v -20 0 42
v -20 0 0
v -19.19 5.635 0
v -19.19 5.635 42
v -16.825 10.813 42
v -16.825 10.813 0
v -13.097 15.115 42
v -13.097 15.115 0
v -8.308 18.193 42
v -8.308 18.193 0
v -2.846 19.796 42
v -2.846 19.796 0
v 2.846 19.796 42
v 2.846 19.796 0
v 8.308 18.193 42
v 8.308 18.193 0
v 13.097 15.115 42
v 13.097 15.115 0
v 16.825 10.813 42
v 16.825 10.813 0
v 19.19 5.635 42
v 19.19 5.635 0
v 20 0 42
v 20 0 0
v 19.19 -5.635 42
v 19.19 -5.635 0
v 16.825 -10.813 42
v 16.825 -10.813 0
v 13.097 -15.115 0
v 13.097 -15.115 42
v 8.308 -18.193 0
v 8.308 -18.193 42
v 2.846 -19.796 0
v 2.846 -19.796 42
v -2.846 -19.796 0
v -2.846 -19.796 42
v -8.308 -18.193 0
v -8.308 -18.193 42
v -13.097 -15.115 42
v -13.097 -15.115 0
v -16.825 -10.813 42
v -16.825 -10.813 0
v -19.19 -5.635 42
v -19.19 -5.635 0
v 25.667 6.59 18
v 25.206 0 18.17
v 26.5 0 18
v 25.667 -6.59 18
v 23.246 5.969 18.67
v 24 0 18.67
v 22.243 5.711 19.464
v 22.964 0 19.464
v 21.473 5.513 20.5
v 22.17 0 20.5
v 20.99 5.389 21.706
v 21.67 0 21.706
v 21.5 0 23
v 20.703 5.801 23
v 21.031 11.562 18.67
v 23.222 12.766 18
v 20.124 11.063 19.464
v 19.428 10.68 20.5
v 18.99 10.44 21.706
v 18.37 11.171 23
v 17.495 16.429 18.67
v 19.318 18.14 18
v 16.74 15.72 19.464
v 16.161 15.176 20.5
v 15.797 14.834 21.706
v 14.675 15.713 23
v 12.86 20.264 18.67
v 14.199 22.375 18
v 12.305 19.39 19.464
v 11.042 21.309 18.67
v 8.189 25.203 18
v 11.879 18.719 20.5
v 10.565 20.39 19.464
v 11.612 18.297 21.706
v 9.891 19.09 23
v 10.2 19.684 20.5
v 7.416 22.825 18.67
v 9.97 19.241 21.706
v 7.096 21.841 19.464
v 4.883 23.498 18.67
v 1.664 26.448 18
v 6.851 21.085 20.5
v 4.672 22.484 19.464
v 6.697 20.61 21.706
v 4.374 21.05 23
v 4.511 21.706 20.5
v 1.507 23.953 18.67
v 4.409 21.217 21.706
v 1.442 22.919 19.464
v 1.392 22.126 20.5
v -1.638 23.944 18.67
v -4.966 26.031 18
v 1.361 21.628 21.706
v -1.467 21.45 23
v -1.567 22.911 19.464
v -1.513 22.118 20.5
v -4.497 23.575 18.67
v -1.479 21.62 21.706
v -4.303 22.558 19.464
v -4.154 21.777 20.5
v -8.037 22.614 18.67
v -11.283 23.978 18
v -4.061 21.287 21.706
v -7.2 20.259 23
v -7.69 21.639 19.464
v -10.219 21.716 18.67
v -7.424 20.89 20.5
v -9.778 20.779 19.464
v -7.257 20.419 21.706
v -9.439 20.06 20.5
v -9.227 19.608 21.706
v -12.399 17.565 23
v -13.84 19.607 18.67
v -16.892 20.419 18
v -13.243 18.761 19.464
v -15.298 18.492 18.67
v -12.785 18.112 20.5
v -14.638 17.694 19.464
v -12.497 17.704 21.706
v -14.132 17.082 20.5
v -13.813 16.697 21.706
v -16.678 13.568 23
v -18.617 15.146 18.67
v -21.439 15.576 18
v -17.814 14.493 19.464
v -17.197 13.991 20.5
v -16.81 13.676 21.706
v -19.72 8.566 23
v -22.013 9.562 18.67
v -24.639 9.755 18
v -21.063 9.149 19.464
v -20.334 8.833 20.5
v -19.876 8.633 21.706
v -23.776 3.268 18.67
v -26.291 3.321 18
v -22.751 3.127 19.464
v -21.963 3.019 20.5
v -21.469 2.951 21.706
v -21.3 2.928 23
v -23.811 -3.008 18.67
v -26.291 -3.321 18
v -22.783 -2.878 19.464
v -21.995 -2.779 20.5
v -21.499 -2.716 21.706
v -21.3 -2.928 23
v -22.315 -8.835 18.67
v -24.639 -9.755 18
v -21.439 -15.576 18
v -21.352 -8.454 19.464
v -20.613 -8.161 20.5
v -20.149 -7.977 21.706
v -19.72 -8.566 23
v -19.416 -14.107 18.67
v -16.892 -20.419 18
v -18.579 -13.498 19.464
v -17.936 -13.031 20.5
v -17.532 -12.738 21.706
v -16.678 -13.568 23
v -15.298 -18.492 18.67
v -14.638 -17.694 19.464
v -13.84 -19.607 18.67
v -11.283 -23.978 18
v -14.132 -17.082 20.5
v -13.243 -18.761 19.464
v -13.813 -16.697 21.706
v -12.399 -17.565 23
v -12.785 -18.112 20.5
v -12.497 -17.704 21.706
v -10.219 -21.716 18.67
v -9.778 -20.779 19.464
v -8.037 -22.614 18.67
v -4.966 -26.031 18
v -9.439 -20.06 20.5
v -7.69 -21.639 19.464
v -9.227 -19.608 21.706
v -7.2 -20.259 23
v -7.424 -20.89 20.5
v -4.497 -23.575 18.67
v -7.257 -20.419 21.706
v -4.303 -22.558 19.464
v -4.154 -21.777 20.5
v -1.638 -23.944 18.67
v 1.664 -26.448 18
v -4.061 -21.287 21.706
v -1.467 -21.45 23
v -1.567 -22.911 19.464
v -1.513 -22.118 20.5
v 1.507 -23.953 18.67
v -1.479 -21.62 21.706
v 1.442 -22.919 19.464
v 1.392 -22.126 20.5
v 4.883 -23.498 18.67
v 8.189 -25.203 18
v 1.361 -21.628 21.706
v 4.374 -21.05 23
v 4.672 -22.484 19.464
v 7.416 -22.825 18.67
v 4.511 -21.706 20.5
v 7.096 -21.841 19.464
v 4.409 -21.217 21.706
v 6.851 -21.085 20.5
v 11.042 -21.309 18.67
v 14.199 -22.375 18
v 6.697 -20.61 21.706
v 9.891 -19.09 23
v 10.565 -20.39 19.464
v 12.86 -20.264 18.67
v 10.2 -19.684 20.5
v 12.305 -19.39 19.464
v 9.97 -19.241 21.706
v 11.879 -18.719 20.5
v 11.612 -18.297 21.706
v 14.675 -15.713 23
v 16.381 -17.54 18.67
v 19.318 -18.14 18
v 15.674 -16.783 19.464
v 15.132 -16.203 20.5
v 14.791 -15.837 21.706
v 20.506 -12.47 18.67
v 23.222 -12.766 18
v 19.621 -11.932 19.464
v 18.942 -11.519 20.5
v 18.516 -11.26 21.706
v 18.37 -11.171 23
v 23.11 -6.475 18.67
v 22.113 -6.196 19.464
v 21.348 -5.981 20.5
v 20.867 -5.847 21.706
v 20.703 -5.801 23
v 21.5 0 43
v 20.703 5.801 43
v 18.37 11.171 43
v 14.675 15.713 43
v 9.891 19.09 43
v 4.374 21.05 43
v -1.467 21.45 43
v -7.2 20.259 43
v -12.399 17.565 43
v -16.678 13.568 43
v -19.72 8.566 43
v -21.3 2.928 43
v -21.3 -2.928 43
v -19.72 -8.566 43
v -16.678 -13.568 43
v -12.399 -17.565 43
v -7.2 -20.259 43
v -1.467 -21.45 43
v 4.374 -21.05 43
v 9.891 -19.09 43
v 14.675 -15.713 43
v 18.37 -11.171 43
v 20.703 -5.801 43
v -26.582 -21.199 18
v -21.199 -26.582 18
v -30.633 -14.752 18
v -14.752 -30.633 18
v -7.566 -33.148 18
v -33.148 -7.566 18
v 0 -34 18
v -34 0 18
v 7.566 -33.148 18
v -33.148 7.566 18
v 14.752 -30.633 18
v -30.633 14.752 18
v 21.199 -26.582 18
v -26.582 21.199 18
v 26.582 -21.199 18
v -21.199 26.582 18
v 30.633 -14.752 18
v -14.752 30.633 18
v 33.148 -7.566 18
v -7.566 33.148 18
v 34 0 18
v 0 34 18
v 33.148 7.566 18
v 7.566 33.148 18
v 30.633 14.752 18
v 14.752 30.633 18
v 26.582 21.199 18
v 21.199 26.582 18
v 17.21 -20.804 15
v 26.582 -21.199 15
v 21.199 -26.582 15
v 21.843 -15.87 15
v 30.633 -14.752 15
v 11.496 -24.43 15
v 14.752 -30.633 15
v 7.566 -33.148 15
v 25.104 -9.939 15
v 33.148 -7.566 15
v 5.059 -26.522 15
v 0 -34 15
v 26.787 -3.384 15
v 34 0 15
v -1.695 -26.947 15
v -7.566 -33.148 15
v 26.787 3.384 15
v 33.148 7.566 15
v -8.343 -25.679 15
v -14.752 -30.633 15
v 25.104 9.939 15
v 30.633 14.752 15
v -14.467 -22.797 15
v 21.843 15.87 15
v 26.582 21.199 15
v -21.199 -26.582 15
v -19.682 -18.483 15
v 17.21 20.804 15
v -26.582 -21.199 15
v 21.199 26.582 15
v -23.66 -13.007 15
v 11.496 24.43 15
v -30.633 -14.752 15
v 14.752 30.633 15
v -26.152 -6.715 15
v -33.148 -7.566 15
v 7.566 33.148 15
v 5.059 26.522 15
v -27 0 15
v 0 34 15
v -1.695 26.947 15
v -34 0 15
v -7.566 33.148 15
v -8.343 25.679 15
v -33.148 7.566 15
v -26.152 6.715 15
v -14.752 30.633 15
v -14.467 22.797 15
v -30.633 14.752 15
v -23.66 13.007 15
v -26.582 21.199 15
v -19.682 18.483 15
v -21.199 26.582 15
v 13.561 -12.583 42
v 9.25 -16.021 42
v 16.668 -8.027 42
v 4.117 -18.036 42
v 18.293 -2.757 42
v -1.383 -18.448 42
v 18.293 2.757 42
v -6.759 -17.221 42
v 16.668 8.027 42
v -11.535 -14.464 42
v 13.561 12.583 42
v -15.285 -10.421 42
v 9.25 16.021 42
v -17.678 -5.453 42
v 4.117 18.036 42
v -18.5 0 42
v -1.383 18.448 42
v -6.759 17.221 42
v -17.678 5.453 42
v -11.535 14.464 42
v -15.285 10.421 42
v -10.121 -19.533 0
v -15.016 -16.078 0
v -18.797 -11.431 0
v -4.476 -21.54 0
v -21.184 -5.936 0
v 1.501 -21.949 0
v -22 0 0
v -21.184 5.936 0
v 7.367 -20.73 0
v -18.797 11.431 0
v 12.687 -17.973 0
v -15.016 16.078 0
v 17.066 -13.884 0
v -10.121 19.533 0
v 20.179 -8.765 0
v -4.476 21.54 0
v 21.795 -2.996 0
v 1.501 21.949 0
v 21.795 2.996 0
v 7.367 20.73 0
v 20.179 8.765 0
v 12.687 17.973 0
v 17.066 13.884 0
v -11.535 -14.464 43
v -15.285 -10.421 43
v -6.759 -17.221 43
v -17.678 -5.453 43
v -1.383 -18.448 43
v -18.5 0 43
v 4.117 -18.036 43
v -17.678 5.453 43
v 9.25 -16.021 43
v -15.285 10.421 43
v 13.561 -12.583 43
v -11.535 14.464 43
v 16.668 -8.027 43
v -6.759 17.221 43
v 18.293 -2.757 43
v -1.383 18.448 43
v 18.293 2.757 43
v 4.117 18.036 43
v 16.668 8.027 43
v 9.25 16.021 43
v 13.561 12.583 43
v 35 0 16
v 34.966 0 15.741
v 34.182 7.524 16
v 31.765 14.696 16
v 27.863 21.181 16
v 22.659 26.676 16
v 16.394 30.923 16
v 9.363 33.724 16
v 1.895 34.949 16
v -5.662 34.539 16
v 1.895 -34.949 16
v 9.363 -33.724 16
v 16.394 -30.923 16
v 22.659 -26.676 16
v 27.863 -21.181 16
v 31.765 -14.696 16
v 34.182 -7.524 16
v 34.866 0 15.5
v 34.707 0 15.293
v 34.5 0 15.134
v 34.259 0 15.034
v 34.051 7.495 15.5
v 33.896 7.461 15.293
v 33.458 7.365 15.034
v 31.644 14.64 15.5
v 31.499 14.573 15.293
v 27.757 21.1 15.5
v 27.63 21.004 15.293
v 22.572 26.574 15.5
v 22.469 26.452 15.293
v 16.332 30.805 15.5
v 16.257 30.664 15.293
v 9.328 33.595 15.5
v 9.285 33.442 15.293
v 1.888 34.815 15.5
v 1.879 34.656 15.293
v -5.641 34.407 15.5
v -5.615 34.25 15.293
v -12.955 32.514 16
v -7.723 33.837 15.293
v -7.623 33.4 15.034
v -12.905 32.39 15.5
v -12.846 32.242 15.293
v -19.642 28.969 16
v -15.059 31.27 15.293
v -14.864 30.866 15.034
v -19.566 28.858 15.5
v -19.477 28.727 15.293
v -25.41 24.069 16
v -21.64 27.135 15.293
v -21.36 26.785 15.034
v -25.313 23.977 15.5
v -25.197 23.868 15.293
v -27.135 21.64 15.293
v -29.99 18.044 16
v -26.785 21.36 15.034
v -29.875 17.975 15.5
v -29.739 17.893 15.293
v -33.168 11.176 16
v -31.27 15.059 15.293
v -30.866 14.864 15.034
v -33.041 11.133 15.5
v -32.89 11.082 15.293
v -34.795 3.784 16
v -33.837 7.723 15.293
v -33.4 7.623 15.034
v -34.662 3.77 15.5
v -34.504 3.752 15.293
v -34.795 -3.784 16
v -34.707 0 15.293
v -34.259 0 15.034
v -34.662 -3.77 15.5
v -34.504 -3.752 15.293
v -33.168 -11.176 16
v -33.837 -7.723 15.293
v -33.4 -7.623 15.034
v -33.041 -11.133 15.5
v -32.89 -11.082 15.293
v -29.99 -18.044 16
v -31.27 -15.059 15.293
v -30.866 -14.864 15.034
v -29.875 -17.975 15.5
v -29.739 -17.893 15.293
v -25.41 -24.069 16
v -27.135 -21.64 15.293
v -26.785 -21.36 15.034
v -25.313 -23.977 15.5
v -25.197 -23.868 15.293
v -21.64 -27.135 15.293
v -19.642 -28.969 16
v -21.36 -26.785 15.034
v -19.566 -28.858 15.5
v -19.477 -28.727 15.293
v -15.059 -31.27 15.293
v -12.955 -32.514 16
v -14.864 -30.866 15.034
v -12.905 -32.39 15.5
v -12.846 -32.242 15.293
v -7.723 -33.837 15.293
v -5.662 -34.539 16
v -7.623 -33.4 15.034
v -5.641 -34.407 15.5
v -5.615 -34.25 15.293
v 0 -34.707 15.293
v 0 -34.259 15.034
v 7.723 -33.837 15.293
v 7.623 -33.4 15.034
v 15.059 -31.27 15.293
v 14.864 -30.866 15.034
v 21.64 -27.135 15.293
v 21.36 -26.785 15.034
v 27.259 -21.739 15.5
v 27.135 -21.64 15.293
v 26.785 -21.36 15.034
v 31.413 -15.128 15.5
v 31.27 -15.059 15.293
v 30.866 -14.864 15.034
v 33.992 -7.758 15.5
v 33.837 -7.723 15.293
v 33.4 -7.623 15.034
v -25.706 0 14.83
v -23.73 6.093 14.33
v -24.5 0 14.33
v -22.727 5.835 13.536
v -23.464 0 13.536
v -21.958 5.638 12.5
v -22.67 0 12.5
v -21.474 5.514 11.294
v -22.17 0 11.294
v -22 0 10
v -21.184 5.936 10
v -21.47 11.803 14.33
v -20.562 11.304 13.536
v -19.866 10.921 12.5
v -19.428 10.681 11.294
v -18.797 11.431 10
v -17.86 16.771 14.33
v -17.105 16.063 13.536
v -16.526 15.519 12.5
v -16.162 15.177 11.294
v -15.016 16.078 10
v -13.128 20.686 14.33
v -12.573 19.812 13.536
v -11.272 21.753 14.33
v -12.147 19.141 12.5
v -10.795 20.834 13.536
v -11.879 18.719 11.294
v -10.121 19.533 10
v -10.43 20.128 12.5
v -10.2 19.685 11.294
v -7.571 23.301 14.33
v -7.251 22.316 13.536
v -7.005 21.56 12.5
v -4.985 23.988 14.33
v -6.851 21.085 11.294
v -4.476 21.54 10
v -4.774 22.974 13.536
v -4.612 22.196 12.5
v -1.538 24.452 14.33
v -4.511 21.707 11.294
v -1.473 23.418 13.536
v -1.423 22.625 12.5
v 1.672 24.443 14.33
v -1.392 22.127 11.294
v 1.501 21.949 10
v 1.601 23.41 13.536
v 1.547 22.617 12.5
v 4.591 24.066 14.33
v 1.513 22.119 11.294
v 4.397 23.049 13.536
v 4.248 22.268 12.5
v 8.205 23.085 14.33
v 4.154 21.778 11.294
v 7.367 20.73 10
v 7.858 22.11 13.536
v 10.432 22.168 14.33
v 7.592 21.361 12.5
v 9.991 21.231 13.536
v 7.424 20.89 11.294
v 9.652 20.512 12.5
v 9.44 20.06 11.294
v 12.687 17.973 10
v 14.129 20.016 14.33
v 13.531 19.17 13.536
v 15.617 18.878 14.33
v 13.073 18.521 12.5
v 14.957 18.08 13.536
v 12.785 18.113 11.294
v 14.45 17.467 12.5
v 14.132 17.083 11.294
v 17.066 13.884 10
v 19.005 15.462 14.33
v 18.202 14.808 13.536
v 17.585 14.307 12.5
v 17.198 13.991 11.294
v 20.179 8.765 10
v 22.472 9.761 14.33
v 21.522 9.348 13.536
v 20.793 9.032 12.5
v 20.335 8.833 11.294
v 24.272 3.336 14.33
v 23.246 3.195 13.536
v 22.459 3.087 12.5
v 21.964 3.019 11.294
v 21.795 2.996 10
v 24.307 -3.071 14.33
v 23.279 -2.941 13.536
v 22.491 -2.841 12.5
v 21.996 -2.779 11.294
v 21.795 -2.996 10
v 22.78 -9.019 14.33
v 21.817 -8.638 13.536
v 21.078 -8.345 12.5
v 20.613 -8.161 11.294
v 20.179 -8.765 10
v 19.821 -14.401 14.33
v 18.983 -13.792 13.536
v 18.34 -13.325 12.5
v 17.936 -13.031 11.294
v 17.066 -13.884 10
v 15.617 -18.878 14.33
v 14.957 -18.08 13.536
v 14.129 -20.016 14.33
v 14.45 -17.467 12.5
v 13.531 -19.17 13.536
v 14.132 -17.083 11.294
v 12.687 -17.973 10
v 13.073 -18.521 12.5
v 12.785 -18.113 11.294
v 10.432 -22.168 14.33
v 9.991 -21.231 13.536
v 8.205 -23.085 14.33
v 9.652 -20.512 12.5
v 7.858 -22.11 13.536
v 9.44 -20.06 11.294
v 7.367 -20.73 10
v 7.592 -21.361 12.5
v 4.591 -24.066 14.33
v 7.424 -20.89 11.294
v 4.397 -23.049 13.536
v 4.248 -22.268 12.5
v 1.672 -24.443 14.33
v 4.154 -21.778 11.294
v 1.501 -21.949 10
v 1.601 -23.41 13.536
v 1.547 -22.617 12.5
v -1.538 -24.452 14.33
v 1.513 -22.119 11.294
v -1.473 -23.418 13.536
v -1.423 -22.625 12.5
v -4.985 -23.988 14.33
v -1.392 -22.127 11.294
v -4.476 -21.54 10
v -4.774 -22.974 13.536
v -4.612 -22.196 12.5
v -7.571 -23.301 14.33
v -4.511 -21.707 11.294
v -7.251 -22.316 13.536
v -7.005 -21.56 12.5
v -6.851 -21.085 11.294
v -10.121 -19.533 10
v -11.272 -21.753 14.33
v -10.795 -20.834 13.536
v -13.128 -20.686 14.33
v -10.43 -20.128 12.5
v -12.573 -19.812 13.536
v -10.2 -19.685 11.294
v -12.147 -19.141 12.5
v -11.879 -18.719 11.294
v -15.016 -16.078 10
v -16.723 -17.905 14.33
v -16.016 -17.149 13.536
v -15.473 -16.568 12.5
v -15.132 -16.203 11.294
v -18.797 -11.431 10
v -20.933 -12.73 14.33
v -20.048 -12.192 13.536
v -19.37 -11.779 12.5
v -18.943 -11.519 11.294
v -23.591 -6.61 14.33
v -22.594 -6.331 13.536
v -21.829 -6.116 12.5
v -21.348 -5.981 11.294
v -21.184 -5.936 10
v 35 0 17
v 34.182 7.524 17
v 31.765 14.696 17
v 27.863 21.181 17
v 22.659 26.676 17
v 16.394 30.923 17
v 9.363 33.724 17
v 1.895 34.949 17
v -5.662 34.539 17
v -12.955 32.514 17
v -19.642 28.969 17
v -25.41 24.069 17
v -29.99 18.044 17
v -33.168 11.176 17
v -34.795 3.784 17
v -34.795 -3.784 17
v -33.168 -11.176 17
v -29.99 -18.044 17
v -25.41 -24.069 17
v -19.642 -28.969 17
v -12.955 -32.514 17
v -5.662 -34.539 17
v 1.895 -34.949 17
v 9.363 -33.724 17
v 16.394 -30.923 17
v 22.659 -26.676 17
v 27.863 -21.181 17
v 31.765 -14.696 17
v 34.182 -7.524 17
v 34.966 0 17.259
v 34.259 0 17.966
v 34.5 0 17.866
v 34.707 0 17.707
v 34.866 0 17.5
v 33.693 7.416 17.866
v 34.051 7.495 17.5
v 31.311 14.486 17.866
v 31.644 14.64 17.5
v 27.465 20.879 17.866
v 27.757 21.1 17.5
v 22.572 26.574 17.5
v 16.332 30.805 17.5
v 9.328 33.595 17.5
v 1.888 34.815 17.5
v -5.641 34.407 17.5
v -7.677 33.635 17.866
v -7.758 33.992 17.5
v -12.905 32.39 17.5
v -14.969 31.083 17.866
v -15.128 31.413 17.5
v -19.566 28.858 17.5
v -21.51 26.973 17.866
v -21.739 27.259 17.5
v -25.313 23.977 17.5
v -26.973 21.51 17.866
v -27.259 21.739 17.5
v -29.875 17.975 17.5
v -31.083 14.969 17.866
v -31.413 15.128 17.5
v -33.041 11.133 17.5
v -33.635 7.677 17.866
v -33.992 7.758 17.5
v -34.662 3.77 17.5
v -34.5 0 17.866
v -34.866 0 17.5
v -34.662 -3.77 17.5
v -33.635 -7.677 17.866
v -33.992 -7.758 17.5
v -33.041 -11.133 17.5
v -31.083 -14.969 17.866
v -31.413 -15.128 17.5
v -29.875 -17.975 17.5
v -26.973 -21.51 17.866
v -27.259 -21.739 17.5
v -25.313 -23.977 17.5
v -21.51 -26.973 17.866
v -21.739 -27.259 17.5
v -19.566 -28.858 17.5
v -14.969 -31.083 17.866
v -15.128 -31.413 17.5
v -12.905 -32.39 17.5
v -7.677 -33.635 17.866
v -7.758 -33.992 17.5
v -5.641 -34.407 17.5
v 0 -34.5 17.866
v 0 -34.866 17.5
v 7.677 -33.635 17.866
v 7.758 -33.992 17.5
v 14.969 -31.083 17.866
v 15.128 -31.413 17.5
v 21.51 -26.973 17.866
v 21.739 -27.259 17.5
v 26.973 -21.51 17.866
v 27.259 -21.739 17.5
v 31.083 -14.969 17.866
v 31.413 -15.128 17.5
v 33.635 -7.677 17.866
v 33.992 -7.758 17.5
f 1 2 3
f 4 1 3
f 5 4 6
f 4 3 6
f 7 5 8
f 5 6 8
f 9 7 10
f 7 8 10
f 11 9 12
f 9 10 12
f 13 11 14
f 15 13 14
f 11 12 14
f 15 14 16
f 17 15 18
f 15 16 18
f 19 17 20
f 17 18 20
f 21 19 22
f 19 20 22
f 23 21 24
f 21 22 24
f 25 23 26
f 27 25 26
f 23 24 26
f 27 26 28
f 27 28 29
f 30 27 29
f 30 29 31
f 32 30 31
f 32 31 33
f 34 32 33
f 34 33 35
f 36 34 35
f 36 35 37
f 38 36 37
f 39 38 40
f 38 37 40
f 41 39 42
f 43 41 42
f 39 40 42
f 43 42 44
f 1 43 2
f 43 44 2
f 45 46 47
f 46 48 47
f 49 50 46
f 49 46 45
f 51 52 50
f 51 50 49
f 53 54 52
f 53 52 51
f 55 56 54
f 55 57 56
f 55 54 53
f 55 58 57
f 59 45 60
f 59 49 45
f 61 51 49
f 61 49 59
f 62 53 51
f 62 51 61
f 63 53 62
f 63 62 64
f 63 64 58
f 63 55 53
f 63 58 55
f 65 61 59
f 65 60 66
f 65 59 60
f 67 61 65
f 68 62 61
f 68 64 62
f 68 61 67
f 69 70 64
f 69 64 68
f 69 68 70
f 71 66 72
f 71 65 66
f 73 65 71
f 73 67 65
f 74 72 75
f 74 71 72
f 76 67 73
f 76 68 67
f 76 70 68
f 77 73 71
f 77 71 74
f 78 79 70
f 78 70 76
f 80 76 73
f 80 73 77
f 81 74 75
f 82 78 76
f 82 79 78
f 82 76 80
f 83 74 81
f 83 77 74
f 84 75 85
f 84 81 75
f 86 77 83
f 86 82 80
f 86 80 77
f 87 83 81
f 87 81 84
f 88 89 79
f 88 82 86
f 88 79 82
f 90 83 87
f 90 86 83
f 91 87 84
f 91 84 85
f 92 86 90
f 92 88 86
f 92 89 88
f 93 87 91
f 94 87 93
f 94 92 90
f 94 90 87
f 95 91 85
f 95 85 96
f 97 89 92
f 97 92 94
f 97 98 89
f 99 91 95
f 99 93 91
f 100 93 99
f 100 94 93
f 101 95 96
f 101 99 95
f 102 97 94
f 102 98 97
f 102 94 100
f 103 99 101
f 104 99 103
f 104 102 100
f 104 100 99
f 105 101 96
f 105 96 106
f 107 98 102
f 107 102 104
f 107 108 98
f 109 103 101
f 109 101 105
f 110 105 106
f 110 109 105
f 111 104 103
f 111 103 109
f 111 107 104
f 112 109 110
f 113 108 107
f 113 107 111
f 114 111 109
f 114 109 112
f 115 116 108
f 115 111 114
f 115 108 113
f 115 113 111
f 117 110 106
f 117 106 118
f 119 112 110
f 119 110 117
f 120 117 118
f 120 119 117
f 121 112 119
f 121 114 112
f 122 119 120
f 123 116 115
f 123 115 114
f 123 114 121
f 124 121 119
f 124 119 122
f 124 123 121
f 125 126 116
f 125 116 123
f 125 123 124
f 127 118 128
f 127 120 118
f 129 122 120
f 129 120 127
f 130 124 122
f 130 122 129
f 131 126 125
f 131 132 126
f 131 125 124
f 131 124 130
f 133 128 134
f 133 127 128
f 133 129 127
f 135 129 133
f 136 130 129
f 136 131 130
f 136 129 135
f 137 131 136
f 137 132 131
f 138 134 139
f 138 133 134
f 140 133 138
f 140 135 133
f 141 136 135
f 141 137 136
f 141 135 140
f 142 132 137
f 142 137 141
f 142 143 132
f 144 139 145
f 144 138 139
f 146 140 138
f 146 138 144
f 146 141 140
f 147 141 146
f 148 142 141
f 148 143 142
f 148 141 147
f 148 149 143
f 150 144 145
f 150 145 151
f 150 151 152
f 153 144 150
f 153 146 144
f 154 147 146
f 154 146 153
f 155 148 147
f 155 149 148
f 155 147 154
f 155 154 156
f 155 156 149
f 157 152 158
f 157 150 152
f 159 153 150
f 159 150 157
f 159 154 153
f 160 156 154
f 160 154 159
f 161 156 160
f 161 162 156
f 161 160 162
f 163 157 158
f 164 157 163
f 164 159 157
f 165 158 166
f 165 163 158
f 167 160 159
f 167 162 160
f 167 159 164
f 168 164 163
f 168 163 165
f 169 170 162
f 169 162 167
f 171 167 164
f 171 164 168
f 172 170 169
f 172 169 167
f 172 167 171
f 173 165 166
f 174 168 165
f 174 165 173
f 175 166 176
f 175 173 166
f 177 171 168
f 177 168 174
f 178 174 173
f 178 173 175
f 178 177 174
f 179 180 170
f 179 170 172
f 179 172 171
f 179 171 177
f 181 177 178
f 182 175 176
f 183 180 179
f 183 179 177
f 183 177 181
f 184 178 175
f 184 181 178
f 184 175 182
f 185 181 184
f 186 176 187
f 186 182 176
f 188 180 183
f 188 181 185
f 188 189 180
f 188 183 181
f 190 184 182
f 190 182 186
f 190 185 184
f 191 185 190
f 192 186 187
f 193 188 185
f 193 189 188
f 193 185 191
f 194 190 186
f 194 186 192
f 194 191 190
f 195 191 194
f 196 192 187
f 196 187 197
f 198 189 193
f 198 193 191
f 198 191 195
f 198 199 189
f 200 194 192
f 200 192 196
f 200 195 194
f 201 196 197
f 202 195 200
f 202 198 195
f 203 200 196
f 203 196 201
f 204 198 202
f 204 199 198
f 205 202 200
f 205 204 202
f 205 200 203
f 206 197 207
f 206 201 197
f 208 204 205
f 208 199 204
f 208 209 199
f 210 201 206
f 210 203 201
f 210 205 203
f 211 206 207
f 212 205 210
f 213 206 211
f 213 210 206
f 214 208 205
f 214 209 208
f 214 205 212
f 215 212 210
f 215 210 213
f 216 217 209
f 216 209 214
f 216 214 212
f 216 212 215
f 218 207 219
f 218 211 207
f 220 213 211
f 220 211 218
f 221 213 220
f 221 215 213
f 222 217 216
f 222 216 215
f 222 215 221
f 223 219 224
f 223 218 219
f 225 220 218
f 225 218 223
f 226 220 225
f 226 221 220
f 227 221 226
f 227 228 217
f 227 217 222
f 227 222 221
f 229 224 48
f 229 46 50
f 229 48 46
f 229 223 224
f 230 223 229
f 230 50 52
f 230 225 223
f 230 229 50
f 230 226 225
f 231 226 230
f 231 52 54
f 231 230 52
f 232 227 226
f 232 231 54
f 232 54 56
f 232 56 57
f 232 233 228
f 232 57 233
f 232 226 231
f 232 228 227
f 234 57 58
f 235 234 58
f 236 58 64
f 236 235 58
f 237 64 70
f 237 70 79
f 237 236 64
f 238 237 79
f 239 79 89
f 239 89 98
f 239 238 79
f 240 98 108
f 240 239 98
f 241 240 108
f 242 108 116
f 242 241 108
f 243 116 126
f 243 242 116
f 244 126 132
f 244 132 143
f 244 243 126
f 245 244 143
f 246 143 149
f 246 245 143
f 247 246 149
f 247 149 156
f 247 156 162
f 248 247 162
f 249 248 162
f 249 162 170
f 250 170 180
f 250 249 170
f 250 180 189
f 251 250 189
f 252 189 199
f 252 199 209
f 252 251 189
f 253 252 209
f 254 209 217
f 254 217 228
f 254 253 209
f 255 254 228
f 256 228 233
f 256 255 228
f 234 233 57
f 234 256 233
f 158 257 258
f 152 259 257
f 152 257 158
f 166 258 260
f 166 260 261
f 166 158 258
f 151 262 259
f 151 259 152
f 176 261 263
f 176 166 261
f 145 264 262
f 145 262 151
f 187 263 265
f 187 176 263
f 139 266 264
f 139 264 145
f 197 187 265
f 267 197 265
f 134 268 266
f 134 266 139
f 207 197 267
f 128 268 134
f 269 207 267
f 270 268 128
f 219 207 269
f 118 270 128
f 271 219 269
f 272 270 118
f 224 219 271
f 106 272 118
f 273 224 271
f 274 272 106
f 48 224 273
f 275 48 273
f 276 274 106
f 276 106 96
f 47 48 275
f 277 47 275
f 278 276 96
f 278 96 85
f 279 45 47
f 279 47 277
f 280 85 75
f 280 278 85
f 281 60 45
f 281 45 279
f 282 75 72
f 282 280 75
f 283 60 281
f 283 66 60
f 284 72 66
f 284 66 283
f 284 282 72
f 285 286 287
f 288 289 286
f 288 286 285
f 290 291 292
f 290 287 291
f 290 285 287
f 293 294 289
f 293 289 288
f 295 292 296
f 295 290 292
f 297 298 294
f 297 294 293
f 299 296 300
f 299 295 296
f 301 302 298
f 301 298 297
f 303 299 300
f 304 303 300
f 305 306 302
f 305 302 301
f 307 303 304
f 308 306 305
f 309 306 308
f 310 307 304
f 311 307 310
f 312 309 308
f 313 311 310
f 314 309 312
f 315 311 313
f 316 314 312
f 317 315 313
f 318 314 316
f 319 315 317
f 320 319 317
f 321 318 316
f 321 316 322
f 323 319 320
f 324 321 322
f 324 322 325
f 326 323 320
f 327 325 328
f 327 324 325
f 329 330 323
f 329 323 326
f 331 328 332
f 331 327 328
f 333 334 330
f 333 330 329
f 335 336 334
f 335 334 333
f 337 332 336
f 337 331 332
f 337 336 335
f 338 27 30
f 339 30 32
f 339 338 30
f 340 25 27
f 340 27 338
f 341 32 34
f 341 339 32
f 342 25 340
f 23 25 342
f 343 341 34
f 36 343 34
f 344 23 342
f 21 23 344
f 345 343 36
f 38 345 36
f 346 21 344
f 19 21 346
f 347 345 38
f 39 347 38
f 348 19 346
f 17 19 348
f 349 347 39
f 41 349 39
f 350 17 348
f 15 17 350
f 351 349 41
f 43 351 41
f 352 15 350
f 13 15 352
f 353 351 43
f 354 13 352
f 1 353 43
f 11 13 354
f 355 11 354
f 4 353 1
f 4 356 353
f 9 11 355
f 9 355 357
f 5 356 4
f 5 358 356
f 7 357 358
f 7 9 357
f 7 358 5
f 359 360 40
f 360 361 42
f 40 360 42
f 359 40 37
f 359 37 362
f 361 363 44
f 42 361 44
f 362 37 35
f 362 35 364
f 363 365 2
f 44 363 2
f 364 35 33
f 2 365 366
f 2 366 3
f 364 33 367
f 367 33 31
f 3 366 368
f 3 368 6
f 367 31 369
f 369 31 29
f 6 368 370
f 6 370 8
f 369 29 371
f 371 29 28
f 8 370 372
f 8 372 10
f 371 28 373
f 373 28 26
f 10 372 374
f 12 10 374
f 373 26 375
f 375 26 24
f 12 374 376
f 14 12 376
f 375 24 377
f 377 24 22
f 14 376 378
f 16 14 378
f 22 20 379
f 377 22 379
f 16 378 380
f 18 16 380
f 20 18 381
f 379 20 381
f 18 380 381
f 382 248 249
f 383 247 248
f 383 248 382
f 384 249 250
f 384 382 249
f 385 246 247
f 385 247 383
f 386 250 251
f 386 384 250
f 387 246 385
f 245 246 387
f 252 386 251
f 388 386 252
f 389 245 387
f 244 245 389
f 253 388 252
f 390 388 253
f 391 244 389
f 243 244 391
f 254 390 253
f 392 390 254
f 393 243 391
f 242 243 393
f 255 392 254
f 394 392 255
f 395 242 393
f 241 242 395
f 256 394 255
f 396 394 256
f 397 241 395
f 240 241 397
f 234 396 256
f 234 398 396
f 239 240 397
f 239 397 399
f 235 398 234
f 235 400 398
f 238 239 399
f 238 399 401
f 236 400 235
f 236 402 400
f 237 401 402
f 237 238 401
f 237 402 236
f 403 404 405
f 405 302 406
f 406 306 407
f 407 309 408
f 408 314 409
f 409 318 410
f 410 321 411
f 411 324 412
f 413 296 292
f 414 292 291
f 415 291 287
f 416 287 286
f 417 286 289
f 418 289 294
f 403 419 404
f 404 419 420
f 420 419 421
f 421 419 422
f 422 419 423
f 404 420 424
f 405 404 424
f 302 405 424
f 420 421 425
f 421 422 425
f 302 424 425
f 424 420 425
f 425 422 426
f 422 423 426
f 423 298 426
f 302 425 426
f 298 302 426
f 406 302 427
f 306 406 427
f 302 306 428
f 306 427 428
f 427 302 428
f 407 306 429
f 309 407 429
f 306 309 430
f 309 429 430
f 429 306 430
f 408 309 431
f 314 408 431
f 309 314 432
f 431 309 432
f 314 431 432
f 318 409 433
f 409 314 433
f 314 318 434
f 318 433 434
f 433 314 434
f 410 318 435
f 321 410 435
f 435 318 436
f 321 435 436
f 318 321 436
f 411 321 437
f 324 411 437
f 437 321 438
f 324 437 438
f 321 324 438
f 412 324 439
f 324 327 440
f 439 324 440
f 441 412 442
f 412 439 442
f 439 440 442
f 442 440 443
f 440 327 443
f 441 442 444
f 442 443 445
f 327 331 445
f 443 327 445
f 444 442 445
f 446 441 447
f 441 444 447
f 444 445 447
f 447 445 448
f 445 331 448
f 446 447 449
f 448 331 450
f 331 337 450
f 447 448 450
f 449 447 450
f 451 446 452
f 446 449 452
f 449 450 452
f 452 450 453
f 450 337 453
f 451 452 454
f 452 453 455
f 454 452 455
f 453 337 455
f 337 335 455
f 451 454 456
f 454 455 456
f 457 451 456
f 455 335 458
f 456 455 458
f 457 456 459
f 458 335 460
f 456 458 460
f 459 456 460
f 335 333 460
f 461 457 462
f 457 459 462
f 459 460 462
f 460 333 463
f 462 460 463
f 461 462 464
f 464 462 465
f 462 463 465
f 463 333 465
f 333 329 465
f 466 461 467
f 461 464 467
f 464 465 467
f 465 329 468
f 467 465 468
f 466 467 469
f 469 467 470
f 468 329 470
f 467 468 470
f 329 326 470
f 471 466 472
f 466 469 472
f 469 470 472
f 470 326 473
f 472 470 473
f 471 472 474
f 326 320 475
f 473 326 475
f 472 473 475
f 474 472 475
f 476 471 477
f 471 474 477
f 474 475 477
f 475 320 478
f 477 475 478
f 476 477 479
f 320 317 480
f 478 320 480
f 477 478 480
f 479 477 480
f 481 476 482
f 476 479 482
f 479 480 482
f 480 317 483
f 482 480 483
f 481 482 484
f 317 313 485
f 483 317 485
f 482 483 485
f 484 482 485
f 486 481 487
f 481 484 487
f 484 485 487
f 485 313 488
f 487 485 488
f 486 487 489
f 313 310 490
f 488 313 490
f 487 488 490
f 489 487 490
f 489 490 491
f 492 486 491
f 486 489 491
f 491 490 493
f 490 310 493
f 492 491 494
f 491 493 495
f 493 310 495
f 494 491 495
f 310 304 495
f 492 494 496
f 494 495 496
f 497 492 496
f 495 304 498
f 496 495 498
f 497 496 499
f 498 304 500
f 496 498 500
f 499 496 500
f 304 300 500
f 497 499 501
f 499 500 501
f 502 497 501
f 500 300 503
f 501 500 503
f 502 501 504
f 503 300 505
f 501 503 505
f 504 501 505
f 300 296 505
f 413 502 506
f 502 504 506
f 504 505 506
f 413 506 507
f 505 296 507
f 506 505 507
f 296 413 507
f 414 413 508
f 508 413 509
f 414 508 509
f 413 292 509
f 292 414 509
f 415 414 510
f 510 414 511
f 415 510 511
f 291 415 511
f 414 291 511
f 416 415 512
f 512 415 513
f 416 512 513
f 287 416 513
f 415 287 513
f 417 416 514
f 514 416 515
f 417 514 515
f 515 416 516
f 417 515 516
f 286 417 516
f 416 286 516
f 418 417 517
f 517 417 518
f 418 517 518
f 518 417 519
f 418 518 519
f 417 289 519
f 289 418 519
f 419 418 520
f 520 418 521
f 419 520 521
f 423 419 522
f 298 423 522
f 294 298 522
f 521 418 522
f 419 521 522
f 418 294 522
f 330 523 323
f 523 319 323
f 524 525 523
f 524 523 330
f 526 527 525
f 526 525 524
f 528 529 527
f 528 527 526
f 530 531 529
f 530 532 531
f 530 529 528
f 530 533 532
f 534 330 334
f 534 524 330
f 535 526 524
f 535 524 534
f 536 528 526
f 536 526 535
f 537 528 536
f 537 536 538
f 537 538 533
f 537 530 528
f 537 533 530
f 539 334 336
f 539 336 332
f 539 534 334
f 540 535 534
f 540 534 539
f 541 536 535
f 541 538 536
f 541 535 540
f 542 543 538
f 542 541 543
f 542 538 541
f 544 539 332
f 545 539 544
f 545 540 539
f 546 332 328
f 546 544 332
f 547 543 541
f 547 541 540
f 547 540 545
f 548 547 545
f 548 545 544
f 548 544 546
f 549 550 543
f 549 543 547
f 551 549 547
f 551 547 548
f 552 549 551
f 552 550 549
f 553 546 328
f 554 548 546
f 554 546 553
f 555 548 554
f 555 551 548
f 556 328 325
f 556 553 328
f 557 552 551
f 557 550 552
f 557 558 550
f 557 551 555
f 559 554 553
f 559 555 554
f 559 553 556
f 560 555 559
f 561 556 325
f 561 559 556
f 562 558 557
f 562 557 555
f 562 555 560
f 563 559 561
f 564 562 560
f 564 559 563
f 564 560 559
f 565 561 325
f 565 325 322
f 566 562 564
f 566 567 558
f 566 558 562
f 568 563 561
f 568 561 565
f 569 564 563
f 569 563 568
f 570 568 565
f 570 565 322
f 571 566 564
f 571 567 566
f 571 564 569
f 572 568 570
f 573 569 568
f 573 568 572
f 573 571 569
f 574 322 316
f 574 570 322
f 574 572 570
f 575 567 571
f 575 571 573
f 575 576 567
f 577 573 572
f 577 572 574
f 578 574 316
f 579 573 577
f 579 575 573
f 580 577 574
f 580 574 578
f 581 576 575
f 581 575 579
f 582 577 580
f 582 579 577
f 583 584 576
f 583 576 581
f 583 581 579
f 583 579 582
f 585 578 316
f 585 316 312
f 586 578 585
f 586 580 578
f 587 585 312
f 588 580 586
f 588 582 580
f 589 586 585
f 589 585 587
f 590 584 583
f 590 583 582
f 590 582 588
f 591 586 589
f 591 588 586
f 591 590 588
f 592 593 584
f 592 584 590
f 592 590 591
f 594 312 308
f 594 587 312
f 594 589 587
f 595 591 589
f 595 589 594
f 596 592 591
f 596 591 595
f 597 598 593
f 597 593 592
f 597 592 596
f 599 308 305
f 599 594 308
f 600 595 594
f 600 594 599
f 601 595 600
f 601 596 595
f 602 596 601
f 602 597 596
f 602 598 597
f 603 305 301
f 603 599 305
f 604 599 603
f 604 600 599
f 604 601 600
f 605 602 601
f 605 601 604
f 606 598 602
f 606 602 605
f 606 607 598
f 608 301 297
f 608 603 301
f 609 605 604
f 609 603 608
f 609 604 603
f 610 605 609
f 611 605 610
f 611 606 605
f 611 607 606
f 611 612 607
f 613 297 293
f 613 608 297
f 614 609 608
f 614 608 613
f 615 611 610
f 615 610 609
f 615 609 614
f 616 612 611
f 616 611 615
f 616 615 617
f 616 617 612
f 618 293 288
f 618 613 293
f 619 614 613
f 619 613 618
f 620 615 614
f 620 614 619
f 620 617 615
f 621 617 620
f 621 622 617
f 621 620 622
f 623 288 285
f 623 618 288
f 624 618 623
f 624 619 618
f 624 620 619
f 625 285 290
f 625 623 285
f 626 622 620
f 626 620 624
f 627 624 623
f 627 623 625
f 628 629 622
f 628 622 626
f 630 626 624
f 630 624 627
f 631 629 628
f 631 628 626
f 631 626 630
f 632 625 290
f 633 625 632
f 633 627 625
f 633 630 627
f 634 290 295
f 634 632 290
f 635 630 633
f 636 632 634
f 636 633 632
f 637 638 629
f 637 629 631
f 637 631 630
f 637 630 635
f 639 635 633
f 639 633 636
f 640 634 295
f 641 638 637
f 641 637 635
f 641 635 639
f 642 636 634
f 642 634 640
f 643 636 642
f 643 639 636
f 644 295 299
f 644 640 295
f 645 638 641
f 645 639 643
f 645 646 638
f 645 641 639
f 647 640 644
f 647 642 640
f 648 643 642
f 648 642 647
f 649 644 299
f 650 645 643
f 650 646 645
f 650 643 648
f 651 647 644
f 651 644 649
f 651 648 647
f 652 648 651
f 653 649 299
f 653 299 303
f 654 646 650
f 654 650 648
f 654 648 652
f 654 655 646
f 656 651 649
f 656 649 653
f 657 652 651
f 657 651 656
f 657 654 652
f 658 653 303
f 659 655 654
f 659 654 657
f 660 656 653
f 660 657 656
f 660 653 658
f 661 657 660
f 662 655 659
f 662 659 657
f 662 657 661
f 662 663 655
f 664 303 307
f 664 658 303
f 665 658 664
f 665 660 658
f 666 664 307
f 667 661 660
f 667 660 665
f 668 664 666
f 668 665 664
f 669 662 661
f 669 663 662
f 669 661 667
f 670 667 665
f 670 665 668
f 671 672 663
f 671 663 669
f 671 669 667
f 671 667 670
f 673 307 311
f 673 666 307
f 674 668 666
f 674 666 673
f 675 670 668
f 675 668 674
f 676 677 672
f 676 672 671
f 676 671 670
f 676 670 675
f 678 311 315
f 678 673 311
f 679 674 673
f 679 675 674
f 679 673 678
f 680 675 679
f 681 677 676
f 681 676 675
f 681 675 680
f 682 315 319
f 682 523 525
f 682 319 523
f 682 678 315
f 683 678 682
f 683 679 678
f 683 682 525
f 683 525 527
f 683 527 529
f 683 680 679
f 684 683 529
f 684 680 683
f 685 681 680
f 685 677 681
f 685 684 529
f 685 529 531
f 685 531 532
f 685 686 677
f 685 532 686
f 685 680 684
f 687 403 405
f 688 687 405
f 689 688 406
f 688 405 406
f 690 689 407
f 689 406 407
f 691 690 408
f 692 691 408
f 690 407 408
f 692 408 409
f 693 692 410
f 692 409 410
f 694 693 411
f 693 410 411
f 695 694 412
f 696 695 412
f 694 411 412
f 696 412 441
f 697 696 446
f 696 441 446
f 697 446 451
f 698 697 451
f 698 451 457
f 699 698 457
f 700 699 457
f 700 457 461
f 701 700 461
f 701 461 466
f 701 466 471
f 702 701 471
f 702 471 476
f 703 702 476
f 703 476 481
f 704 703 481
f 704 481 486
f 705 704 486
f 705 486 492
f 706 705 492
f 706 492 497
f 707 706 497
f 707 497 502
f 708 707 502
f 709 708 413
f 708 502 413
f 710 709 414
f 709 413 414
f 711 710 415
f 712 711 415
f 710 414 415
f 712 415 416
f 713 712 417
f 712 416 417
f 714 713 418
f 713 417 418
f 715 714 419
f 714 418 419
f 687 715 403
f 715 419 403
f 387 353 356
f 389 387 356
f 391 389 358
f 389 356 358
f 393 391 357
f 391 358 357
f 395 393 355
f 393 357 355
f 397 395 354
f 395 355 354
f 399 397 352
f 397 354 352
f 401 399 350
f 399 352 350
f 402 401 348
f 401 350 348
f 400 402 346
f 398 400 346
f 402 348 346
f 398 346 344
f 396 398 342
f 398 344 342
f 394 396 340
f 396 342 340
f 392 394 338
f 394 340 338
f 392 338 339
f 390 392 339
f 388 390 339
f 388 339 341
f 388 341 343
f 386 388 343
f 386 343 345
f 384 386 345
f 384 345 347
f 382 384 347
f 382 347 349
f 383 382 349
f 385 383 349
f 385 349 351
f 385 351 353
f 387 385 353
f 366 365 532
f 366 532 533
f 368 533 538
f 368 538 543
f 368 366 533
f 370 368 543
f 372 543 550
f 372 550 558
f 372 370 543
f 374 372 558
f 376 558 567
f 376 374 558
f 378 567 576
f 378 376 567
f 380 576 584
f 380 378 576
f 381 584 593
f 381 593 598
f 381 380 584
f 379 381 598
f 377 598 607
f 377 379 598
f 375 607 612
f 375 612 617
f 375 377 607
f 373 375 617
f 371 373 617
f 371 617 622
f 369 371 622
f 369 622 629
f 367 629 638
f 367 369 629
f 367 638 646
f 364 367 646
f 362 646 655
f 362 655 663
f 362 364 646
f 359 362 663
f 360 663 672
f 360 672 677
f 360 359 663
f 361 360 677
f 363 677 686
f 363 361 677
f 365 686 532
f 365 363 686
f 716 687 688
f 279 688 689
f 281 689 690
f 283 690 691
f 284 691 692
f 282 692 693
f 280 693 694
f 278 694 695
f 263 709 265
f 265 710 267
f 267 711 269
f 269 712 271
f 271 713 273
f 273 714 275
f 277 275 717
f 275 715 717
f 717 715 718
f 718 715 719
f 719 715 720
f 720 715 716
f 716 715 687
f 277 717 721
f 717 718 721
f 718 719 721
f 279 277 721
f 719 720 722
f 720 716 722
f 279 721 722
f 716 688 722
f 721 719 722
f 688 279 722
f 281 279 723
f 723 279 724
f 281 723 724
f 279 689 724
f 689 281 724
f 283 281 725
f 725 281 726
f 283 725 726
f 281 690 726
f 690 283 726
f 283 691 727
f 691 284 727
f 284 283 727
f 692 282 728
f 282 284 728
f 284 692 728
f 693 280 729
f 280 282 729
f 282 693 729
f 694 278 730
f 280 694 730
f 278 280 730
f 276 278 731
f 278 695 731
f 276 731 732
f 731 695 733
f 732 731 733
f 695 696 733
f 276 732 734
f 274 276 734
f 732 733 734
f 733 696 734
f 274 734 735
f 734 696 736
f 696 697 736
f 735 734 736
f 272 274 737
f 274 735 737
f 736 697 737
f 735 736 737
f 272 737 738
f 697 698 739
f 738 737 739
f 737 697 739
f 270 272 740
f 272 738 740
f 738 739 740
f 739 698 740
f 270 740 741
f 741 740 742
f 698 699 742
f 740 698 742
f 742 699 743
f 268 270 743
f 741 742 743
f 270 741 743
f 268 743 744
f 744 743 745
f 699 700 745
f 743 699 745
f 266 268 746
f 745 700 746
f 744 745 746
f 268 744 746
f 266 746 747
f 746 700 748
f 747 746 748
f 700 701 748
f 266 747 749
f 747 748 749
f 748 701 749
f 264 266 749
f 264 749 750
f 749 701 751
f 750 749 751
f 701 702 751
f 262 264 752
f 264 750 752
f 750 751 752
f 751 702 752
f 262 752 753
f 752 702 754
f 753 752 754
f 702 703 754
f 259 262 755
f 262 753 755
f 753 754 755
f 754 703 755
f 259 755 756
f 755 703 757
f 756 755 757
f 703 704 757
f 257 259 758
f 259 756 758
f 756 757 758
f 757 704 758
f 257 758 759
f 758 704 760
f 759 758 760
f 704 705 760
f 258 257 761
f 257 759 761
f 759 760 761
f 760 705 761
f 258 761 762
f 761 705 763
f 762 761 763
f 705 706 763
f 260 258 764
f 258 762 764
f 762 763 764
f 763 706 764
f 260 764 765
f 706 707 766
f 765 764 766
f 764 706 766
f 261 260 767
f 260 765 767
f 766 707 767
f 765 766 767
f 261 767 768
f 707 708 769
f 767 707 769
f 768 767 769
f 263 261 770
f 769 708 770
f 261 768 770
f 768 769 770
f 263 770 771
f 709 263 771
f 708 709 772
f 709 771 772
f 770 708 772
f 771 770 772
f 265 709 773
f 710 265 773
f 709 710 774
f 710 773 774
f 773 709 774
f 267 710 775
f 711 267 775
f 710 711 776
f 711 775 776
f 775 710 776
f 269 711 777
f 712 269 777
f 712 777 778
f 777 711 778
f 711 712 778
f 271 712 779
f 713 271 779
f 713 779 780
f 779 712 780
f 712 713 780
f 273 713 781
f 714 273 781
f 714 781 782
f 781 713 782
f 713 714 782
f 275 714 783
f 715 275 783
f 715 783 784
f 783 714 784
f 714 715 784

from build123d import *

# Parameters (mm, degrees)
SKETCH_1_R          = 35
EXTRUDE_1_DEPTH     = 43
SKETCH_2_R          = 35
SKETCH_2_R_2        = 22
CUT_EXTRUDE_1_DEPTH = 15
SKETCH_3_R          = 35
SKETCH_3_R_2        = 21.5
CUT_EXTRUDE_2_DEPTH = 25
SKETCH_4_R          = 18.5
CUT_EXTRUDE_3_DEPTH = 44
SKETCH_5_R          = 20
CUT_EXTRUDE_4_DEPTH = 42
FILLET_1_R          = 5
FILLET_2_R          = 1


with BuildPart() as part:
    # ｽｹｯﾁ1 → ﾎﾞｽ - 押し出し1 (new body)
    with BuildSketch(Plane.XY):
        Circle(SKETCH_1_R)
    extrude(amount=EXTRUDE_1_DEPTH)

    # ｽｹｯﾁ2 → ｶｯﾄ - 押し出し1 (cut)
    with BuildSketch(Plane(origin=(0, 0, 0), x_dir=(-1, 0, 0), z_dir=(0, 0, -1))):
        Circle(SKETCH_2_R)
        Circle(SKETCH_2_R_2, mode=Mode.SUBTRACT)
    extrude(amount=-CUT_EXTRUDE_1_DEPTH, mode=Mode.SUBTRACT)

    # ｽｹｯﾁ3 → ｶｯﾄ - 押し出し2 (cut)
    with BuildSketch(Plane.XY.offset(43)):
        Circle(SKETCH_3_R)
        Circle(SKETCH_3_R_2, mode=Mode.SUBTRACT)
    extrude(amount=-CUT_EXTRUDE_2_DEPTH, mode=Mode.SUBTRACT)

    # ｽｹｯﾁ4 → ｶｯﾄ - 押し出し3 (cut, through all)
    with BuildSketch(Plane(origin=(0, 0, 0), x_dir=(-1, 0, 0), z_dir=(0, 0, -1))):
        Circle(SKETCH_4_R)
    extrude(amount=-CUT_EXTRUDE_3_DEPTH, mode=Mode.SUBTRACT)

    # ｽｹｯﾁ5 → ｶｯﾄ - 押し出し4 (cut)
    with BuildSketch(Plane(origin=(0, 0, 0), x_dir=(-1, 0, 0), z_dir=(0, 0, -1))):
        Circle(SKETCH_5_R)
    extrude(amount=-CUT_EXTRUDE_4_DEPTH, mode=Mode.SUBTRACT)

    # ﾌｨﾚｯﾄ1
    fillet_1_edges = [part.edges().sort_by_distance(p)[0] for p in [
        (-21.5, 0, 18),
        (22, 0, 15),
    ]]
    fillet(fillet_1_edges, radius=FILLET_1_R)

    # ﾌｨﾚｯﾄ2
    fillet_2_edges = [part.edges().sort_by_distance(p)[0] for p in [
        (-35, 0, 18),
        (-35, 0, 15),
    ]]
    fillet(fillet_2_edges, radius=FILLET_2_R)


solid = part.part
